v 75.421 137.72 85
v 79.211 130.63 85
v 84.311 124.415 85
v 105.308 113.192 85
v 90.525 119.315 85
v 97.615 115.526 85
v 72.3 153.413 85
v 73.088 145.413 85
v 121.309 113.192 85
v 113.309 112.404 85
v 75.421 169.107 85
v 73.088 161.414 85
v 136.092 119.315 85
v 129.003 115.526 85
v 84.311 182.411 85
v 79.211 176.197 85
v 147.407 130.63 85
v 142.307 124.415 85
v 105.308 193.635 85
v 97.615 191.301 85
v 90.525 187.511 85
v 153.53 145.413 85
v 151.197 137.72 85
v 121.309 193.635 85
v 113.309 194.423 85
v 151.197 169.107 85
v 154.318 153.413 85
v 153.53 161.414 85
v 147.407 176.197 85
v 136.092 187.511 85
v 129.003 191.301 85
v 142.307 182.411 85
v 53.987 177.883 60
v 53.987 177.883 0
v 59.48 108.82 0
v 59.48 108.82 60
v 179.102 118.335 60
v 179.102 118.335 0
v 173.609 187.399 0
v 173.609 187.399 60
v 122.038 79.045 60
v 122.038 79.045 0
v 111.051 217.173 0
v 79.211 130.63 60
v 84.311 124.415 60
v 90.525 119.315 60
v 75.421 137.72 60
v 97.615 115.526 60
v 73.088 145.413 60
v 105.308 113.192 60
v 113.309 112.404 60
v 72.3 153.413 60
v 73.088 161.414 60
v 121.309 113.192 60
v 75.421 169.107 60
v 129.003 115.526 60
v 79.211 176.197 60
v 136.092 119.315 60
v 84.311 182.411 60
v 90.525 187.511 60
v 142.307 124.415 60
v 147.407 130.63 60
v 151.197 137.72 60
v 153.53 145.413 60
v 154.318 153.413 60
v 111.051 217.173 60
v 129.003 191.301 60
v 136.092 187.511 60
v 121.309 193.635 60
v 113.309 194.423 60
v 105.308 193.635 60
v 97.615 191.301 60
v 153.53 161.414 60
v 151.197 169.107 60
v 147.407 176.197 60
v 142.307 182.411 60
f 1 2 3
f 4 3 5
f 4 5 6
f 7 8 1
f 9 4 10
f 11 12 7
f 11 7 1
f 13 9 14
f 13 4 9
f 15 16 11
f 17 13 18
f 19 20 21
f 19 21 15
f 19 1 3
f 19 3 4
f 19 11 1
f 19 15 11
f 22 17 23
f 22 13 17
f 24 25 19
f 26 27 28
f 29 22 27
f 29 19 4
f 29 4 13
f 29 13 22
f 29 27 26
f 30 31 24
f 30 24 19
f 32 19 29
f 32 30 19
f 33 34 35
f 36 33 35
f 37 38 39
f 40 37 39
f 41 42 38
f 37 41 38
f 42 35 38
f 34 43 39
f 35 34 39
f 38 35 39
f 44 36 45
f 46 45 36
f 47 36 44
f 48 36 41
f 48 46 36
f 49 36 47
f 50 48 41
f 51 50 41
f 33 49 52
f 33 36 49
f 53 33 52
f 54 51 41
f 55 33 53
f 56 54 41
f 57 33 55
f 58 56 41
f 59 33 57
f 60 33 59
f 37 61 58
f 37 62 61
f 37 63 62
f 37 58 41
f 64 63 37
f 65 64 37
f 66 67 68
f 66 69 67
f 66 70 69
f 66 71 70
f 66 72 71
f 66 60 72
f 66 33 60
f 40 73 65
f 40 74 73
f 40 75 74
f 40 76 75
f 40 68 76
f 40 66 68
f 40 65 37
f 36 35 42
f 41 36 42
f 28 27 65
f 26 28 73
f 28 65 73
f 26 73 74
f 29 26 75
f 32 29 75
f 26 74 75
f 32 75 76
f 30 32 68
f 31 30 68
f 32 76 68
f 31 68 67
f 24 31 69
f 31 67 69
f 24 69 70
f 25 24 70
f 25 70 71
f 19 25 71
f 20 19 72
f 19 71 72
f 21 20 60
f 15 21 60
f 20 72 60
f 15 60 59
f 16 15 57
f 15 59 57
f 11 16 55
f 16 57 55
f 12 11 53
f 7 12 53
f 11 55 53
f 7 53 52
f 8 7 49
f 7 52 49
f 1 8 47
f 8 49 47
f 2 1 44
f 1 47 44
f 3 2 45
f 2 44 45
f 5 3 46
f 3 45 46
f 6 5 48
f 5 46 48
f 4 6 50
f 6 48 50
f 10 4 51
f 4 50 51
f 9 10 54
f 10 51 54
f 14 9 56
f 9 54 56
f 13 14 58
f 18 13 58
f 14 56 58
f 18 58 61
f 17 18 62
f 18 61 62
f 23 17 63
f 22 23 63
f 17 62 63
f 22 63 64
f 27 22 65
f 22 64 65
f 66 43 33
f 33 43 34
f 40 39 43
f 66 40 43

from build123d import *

# Parameters (mm, degrees)
F1_DEPTH = 60
F2_R     = 41.0093140969
F3_DEPTH = 25


with BuildPart() as f1:
    # F0 (on Top) → F1 (new body)
    with BuildSketch(Plane.XY):
        Polygon((111.0508568783, 217.1731047251), (53.9866397324, 177.8834735035), (59.4803499027, 108.8195961973), (122.0382772188, 79.0453501127), (179.1024943647, 118.3349813343), (173.6087841944, 187.3988586405), align=None)
    extrude(amount=F1_DEPTH)

    # F2 (on face) → F3 (join)
    with BuildSketch(Plane.XY.offset(60)):
        with Locations((113.3089438081, 153.4131914377)):
            Circle(F2_R)
    extrude(amount=F3_DEPTH)


solid = f1.part
